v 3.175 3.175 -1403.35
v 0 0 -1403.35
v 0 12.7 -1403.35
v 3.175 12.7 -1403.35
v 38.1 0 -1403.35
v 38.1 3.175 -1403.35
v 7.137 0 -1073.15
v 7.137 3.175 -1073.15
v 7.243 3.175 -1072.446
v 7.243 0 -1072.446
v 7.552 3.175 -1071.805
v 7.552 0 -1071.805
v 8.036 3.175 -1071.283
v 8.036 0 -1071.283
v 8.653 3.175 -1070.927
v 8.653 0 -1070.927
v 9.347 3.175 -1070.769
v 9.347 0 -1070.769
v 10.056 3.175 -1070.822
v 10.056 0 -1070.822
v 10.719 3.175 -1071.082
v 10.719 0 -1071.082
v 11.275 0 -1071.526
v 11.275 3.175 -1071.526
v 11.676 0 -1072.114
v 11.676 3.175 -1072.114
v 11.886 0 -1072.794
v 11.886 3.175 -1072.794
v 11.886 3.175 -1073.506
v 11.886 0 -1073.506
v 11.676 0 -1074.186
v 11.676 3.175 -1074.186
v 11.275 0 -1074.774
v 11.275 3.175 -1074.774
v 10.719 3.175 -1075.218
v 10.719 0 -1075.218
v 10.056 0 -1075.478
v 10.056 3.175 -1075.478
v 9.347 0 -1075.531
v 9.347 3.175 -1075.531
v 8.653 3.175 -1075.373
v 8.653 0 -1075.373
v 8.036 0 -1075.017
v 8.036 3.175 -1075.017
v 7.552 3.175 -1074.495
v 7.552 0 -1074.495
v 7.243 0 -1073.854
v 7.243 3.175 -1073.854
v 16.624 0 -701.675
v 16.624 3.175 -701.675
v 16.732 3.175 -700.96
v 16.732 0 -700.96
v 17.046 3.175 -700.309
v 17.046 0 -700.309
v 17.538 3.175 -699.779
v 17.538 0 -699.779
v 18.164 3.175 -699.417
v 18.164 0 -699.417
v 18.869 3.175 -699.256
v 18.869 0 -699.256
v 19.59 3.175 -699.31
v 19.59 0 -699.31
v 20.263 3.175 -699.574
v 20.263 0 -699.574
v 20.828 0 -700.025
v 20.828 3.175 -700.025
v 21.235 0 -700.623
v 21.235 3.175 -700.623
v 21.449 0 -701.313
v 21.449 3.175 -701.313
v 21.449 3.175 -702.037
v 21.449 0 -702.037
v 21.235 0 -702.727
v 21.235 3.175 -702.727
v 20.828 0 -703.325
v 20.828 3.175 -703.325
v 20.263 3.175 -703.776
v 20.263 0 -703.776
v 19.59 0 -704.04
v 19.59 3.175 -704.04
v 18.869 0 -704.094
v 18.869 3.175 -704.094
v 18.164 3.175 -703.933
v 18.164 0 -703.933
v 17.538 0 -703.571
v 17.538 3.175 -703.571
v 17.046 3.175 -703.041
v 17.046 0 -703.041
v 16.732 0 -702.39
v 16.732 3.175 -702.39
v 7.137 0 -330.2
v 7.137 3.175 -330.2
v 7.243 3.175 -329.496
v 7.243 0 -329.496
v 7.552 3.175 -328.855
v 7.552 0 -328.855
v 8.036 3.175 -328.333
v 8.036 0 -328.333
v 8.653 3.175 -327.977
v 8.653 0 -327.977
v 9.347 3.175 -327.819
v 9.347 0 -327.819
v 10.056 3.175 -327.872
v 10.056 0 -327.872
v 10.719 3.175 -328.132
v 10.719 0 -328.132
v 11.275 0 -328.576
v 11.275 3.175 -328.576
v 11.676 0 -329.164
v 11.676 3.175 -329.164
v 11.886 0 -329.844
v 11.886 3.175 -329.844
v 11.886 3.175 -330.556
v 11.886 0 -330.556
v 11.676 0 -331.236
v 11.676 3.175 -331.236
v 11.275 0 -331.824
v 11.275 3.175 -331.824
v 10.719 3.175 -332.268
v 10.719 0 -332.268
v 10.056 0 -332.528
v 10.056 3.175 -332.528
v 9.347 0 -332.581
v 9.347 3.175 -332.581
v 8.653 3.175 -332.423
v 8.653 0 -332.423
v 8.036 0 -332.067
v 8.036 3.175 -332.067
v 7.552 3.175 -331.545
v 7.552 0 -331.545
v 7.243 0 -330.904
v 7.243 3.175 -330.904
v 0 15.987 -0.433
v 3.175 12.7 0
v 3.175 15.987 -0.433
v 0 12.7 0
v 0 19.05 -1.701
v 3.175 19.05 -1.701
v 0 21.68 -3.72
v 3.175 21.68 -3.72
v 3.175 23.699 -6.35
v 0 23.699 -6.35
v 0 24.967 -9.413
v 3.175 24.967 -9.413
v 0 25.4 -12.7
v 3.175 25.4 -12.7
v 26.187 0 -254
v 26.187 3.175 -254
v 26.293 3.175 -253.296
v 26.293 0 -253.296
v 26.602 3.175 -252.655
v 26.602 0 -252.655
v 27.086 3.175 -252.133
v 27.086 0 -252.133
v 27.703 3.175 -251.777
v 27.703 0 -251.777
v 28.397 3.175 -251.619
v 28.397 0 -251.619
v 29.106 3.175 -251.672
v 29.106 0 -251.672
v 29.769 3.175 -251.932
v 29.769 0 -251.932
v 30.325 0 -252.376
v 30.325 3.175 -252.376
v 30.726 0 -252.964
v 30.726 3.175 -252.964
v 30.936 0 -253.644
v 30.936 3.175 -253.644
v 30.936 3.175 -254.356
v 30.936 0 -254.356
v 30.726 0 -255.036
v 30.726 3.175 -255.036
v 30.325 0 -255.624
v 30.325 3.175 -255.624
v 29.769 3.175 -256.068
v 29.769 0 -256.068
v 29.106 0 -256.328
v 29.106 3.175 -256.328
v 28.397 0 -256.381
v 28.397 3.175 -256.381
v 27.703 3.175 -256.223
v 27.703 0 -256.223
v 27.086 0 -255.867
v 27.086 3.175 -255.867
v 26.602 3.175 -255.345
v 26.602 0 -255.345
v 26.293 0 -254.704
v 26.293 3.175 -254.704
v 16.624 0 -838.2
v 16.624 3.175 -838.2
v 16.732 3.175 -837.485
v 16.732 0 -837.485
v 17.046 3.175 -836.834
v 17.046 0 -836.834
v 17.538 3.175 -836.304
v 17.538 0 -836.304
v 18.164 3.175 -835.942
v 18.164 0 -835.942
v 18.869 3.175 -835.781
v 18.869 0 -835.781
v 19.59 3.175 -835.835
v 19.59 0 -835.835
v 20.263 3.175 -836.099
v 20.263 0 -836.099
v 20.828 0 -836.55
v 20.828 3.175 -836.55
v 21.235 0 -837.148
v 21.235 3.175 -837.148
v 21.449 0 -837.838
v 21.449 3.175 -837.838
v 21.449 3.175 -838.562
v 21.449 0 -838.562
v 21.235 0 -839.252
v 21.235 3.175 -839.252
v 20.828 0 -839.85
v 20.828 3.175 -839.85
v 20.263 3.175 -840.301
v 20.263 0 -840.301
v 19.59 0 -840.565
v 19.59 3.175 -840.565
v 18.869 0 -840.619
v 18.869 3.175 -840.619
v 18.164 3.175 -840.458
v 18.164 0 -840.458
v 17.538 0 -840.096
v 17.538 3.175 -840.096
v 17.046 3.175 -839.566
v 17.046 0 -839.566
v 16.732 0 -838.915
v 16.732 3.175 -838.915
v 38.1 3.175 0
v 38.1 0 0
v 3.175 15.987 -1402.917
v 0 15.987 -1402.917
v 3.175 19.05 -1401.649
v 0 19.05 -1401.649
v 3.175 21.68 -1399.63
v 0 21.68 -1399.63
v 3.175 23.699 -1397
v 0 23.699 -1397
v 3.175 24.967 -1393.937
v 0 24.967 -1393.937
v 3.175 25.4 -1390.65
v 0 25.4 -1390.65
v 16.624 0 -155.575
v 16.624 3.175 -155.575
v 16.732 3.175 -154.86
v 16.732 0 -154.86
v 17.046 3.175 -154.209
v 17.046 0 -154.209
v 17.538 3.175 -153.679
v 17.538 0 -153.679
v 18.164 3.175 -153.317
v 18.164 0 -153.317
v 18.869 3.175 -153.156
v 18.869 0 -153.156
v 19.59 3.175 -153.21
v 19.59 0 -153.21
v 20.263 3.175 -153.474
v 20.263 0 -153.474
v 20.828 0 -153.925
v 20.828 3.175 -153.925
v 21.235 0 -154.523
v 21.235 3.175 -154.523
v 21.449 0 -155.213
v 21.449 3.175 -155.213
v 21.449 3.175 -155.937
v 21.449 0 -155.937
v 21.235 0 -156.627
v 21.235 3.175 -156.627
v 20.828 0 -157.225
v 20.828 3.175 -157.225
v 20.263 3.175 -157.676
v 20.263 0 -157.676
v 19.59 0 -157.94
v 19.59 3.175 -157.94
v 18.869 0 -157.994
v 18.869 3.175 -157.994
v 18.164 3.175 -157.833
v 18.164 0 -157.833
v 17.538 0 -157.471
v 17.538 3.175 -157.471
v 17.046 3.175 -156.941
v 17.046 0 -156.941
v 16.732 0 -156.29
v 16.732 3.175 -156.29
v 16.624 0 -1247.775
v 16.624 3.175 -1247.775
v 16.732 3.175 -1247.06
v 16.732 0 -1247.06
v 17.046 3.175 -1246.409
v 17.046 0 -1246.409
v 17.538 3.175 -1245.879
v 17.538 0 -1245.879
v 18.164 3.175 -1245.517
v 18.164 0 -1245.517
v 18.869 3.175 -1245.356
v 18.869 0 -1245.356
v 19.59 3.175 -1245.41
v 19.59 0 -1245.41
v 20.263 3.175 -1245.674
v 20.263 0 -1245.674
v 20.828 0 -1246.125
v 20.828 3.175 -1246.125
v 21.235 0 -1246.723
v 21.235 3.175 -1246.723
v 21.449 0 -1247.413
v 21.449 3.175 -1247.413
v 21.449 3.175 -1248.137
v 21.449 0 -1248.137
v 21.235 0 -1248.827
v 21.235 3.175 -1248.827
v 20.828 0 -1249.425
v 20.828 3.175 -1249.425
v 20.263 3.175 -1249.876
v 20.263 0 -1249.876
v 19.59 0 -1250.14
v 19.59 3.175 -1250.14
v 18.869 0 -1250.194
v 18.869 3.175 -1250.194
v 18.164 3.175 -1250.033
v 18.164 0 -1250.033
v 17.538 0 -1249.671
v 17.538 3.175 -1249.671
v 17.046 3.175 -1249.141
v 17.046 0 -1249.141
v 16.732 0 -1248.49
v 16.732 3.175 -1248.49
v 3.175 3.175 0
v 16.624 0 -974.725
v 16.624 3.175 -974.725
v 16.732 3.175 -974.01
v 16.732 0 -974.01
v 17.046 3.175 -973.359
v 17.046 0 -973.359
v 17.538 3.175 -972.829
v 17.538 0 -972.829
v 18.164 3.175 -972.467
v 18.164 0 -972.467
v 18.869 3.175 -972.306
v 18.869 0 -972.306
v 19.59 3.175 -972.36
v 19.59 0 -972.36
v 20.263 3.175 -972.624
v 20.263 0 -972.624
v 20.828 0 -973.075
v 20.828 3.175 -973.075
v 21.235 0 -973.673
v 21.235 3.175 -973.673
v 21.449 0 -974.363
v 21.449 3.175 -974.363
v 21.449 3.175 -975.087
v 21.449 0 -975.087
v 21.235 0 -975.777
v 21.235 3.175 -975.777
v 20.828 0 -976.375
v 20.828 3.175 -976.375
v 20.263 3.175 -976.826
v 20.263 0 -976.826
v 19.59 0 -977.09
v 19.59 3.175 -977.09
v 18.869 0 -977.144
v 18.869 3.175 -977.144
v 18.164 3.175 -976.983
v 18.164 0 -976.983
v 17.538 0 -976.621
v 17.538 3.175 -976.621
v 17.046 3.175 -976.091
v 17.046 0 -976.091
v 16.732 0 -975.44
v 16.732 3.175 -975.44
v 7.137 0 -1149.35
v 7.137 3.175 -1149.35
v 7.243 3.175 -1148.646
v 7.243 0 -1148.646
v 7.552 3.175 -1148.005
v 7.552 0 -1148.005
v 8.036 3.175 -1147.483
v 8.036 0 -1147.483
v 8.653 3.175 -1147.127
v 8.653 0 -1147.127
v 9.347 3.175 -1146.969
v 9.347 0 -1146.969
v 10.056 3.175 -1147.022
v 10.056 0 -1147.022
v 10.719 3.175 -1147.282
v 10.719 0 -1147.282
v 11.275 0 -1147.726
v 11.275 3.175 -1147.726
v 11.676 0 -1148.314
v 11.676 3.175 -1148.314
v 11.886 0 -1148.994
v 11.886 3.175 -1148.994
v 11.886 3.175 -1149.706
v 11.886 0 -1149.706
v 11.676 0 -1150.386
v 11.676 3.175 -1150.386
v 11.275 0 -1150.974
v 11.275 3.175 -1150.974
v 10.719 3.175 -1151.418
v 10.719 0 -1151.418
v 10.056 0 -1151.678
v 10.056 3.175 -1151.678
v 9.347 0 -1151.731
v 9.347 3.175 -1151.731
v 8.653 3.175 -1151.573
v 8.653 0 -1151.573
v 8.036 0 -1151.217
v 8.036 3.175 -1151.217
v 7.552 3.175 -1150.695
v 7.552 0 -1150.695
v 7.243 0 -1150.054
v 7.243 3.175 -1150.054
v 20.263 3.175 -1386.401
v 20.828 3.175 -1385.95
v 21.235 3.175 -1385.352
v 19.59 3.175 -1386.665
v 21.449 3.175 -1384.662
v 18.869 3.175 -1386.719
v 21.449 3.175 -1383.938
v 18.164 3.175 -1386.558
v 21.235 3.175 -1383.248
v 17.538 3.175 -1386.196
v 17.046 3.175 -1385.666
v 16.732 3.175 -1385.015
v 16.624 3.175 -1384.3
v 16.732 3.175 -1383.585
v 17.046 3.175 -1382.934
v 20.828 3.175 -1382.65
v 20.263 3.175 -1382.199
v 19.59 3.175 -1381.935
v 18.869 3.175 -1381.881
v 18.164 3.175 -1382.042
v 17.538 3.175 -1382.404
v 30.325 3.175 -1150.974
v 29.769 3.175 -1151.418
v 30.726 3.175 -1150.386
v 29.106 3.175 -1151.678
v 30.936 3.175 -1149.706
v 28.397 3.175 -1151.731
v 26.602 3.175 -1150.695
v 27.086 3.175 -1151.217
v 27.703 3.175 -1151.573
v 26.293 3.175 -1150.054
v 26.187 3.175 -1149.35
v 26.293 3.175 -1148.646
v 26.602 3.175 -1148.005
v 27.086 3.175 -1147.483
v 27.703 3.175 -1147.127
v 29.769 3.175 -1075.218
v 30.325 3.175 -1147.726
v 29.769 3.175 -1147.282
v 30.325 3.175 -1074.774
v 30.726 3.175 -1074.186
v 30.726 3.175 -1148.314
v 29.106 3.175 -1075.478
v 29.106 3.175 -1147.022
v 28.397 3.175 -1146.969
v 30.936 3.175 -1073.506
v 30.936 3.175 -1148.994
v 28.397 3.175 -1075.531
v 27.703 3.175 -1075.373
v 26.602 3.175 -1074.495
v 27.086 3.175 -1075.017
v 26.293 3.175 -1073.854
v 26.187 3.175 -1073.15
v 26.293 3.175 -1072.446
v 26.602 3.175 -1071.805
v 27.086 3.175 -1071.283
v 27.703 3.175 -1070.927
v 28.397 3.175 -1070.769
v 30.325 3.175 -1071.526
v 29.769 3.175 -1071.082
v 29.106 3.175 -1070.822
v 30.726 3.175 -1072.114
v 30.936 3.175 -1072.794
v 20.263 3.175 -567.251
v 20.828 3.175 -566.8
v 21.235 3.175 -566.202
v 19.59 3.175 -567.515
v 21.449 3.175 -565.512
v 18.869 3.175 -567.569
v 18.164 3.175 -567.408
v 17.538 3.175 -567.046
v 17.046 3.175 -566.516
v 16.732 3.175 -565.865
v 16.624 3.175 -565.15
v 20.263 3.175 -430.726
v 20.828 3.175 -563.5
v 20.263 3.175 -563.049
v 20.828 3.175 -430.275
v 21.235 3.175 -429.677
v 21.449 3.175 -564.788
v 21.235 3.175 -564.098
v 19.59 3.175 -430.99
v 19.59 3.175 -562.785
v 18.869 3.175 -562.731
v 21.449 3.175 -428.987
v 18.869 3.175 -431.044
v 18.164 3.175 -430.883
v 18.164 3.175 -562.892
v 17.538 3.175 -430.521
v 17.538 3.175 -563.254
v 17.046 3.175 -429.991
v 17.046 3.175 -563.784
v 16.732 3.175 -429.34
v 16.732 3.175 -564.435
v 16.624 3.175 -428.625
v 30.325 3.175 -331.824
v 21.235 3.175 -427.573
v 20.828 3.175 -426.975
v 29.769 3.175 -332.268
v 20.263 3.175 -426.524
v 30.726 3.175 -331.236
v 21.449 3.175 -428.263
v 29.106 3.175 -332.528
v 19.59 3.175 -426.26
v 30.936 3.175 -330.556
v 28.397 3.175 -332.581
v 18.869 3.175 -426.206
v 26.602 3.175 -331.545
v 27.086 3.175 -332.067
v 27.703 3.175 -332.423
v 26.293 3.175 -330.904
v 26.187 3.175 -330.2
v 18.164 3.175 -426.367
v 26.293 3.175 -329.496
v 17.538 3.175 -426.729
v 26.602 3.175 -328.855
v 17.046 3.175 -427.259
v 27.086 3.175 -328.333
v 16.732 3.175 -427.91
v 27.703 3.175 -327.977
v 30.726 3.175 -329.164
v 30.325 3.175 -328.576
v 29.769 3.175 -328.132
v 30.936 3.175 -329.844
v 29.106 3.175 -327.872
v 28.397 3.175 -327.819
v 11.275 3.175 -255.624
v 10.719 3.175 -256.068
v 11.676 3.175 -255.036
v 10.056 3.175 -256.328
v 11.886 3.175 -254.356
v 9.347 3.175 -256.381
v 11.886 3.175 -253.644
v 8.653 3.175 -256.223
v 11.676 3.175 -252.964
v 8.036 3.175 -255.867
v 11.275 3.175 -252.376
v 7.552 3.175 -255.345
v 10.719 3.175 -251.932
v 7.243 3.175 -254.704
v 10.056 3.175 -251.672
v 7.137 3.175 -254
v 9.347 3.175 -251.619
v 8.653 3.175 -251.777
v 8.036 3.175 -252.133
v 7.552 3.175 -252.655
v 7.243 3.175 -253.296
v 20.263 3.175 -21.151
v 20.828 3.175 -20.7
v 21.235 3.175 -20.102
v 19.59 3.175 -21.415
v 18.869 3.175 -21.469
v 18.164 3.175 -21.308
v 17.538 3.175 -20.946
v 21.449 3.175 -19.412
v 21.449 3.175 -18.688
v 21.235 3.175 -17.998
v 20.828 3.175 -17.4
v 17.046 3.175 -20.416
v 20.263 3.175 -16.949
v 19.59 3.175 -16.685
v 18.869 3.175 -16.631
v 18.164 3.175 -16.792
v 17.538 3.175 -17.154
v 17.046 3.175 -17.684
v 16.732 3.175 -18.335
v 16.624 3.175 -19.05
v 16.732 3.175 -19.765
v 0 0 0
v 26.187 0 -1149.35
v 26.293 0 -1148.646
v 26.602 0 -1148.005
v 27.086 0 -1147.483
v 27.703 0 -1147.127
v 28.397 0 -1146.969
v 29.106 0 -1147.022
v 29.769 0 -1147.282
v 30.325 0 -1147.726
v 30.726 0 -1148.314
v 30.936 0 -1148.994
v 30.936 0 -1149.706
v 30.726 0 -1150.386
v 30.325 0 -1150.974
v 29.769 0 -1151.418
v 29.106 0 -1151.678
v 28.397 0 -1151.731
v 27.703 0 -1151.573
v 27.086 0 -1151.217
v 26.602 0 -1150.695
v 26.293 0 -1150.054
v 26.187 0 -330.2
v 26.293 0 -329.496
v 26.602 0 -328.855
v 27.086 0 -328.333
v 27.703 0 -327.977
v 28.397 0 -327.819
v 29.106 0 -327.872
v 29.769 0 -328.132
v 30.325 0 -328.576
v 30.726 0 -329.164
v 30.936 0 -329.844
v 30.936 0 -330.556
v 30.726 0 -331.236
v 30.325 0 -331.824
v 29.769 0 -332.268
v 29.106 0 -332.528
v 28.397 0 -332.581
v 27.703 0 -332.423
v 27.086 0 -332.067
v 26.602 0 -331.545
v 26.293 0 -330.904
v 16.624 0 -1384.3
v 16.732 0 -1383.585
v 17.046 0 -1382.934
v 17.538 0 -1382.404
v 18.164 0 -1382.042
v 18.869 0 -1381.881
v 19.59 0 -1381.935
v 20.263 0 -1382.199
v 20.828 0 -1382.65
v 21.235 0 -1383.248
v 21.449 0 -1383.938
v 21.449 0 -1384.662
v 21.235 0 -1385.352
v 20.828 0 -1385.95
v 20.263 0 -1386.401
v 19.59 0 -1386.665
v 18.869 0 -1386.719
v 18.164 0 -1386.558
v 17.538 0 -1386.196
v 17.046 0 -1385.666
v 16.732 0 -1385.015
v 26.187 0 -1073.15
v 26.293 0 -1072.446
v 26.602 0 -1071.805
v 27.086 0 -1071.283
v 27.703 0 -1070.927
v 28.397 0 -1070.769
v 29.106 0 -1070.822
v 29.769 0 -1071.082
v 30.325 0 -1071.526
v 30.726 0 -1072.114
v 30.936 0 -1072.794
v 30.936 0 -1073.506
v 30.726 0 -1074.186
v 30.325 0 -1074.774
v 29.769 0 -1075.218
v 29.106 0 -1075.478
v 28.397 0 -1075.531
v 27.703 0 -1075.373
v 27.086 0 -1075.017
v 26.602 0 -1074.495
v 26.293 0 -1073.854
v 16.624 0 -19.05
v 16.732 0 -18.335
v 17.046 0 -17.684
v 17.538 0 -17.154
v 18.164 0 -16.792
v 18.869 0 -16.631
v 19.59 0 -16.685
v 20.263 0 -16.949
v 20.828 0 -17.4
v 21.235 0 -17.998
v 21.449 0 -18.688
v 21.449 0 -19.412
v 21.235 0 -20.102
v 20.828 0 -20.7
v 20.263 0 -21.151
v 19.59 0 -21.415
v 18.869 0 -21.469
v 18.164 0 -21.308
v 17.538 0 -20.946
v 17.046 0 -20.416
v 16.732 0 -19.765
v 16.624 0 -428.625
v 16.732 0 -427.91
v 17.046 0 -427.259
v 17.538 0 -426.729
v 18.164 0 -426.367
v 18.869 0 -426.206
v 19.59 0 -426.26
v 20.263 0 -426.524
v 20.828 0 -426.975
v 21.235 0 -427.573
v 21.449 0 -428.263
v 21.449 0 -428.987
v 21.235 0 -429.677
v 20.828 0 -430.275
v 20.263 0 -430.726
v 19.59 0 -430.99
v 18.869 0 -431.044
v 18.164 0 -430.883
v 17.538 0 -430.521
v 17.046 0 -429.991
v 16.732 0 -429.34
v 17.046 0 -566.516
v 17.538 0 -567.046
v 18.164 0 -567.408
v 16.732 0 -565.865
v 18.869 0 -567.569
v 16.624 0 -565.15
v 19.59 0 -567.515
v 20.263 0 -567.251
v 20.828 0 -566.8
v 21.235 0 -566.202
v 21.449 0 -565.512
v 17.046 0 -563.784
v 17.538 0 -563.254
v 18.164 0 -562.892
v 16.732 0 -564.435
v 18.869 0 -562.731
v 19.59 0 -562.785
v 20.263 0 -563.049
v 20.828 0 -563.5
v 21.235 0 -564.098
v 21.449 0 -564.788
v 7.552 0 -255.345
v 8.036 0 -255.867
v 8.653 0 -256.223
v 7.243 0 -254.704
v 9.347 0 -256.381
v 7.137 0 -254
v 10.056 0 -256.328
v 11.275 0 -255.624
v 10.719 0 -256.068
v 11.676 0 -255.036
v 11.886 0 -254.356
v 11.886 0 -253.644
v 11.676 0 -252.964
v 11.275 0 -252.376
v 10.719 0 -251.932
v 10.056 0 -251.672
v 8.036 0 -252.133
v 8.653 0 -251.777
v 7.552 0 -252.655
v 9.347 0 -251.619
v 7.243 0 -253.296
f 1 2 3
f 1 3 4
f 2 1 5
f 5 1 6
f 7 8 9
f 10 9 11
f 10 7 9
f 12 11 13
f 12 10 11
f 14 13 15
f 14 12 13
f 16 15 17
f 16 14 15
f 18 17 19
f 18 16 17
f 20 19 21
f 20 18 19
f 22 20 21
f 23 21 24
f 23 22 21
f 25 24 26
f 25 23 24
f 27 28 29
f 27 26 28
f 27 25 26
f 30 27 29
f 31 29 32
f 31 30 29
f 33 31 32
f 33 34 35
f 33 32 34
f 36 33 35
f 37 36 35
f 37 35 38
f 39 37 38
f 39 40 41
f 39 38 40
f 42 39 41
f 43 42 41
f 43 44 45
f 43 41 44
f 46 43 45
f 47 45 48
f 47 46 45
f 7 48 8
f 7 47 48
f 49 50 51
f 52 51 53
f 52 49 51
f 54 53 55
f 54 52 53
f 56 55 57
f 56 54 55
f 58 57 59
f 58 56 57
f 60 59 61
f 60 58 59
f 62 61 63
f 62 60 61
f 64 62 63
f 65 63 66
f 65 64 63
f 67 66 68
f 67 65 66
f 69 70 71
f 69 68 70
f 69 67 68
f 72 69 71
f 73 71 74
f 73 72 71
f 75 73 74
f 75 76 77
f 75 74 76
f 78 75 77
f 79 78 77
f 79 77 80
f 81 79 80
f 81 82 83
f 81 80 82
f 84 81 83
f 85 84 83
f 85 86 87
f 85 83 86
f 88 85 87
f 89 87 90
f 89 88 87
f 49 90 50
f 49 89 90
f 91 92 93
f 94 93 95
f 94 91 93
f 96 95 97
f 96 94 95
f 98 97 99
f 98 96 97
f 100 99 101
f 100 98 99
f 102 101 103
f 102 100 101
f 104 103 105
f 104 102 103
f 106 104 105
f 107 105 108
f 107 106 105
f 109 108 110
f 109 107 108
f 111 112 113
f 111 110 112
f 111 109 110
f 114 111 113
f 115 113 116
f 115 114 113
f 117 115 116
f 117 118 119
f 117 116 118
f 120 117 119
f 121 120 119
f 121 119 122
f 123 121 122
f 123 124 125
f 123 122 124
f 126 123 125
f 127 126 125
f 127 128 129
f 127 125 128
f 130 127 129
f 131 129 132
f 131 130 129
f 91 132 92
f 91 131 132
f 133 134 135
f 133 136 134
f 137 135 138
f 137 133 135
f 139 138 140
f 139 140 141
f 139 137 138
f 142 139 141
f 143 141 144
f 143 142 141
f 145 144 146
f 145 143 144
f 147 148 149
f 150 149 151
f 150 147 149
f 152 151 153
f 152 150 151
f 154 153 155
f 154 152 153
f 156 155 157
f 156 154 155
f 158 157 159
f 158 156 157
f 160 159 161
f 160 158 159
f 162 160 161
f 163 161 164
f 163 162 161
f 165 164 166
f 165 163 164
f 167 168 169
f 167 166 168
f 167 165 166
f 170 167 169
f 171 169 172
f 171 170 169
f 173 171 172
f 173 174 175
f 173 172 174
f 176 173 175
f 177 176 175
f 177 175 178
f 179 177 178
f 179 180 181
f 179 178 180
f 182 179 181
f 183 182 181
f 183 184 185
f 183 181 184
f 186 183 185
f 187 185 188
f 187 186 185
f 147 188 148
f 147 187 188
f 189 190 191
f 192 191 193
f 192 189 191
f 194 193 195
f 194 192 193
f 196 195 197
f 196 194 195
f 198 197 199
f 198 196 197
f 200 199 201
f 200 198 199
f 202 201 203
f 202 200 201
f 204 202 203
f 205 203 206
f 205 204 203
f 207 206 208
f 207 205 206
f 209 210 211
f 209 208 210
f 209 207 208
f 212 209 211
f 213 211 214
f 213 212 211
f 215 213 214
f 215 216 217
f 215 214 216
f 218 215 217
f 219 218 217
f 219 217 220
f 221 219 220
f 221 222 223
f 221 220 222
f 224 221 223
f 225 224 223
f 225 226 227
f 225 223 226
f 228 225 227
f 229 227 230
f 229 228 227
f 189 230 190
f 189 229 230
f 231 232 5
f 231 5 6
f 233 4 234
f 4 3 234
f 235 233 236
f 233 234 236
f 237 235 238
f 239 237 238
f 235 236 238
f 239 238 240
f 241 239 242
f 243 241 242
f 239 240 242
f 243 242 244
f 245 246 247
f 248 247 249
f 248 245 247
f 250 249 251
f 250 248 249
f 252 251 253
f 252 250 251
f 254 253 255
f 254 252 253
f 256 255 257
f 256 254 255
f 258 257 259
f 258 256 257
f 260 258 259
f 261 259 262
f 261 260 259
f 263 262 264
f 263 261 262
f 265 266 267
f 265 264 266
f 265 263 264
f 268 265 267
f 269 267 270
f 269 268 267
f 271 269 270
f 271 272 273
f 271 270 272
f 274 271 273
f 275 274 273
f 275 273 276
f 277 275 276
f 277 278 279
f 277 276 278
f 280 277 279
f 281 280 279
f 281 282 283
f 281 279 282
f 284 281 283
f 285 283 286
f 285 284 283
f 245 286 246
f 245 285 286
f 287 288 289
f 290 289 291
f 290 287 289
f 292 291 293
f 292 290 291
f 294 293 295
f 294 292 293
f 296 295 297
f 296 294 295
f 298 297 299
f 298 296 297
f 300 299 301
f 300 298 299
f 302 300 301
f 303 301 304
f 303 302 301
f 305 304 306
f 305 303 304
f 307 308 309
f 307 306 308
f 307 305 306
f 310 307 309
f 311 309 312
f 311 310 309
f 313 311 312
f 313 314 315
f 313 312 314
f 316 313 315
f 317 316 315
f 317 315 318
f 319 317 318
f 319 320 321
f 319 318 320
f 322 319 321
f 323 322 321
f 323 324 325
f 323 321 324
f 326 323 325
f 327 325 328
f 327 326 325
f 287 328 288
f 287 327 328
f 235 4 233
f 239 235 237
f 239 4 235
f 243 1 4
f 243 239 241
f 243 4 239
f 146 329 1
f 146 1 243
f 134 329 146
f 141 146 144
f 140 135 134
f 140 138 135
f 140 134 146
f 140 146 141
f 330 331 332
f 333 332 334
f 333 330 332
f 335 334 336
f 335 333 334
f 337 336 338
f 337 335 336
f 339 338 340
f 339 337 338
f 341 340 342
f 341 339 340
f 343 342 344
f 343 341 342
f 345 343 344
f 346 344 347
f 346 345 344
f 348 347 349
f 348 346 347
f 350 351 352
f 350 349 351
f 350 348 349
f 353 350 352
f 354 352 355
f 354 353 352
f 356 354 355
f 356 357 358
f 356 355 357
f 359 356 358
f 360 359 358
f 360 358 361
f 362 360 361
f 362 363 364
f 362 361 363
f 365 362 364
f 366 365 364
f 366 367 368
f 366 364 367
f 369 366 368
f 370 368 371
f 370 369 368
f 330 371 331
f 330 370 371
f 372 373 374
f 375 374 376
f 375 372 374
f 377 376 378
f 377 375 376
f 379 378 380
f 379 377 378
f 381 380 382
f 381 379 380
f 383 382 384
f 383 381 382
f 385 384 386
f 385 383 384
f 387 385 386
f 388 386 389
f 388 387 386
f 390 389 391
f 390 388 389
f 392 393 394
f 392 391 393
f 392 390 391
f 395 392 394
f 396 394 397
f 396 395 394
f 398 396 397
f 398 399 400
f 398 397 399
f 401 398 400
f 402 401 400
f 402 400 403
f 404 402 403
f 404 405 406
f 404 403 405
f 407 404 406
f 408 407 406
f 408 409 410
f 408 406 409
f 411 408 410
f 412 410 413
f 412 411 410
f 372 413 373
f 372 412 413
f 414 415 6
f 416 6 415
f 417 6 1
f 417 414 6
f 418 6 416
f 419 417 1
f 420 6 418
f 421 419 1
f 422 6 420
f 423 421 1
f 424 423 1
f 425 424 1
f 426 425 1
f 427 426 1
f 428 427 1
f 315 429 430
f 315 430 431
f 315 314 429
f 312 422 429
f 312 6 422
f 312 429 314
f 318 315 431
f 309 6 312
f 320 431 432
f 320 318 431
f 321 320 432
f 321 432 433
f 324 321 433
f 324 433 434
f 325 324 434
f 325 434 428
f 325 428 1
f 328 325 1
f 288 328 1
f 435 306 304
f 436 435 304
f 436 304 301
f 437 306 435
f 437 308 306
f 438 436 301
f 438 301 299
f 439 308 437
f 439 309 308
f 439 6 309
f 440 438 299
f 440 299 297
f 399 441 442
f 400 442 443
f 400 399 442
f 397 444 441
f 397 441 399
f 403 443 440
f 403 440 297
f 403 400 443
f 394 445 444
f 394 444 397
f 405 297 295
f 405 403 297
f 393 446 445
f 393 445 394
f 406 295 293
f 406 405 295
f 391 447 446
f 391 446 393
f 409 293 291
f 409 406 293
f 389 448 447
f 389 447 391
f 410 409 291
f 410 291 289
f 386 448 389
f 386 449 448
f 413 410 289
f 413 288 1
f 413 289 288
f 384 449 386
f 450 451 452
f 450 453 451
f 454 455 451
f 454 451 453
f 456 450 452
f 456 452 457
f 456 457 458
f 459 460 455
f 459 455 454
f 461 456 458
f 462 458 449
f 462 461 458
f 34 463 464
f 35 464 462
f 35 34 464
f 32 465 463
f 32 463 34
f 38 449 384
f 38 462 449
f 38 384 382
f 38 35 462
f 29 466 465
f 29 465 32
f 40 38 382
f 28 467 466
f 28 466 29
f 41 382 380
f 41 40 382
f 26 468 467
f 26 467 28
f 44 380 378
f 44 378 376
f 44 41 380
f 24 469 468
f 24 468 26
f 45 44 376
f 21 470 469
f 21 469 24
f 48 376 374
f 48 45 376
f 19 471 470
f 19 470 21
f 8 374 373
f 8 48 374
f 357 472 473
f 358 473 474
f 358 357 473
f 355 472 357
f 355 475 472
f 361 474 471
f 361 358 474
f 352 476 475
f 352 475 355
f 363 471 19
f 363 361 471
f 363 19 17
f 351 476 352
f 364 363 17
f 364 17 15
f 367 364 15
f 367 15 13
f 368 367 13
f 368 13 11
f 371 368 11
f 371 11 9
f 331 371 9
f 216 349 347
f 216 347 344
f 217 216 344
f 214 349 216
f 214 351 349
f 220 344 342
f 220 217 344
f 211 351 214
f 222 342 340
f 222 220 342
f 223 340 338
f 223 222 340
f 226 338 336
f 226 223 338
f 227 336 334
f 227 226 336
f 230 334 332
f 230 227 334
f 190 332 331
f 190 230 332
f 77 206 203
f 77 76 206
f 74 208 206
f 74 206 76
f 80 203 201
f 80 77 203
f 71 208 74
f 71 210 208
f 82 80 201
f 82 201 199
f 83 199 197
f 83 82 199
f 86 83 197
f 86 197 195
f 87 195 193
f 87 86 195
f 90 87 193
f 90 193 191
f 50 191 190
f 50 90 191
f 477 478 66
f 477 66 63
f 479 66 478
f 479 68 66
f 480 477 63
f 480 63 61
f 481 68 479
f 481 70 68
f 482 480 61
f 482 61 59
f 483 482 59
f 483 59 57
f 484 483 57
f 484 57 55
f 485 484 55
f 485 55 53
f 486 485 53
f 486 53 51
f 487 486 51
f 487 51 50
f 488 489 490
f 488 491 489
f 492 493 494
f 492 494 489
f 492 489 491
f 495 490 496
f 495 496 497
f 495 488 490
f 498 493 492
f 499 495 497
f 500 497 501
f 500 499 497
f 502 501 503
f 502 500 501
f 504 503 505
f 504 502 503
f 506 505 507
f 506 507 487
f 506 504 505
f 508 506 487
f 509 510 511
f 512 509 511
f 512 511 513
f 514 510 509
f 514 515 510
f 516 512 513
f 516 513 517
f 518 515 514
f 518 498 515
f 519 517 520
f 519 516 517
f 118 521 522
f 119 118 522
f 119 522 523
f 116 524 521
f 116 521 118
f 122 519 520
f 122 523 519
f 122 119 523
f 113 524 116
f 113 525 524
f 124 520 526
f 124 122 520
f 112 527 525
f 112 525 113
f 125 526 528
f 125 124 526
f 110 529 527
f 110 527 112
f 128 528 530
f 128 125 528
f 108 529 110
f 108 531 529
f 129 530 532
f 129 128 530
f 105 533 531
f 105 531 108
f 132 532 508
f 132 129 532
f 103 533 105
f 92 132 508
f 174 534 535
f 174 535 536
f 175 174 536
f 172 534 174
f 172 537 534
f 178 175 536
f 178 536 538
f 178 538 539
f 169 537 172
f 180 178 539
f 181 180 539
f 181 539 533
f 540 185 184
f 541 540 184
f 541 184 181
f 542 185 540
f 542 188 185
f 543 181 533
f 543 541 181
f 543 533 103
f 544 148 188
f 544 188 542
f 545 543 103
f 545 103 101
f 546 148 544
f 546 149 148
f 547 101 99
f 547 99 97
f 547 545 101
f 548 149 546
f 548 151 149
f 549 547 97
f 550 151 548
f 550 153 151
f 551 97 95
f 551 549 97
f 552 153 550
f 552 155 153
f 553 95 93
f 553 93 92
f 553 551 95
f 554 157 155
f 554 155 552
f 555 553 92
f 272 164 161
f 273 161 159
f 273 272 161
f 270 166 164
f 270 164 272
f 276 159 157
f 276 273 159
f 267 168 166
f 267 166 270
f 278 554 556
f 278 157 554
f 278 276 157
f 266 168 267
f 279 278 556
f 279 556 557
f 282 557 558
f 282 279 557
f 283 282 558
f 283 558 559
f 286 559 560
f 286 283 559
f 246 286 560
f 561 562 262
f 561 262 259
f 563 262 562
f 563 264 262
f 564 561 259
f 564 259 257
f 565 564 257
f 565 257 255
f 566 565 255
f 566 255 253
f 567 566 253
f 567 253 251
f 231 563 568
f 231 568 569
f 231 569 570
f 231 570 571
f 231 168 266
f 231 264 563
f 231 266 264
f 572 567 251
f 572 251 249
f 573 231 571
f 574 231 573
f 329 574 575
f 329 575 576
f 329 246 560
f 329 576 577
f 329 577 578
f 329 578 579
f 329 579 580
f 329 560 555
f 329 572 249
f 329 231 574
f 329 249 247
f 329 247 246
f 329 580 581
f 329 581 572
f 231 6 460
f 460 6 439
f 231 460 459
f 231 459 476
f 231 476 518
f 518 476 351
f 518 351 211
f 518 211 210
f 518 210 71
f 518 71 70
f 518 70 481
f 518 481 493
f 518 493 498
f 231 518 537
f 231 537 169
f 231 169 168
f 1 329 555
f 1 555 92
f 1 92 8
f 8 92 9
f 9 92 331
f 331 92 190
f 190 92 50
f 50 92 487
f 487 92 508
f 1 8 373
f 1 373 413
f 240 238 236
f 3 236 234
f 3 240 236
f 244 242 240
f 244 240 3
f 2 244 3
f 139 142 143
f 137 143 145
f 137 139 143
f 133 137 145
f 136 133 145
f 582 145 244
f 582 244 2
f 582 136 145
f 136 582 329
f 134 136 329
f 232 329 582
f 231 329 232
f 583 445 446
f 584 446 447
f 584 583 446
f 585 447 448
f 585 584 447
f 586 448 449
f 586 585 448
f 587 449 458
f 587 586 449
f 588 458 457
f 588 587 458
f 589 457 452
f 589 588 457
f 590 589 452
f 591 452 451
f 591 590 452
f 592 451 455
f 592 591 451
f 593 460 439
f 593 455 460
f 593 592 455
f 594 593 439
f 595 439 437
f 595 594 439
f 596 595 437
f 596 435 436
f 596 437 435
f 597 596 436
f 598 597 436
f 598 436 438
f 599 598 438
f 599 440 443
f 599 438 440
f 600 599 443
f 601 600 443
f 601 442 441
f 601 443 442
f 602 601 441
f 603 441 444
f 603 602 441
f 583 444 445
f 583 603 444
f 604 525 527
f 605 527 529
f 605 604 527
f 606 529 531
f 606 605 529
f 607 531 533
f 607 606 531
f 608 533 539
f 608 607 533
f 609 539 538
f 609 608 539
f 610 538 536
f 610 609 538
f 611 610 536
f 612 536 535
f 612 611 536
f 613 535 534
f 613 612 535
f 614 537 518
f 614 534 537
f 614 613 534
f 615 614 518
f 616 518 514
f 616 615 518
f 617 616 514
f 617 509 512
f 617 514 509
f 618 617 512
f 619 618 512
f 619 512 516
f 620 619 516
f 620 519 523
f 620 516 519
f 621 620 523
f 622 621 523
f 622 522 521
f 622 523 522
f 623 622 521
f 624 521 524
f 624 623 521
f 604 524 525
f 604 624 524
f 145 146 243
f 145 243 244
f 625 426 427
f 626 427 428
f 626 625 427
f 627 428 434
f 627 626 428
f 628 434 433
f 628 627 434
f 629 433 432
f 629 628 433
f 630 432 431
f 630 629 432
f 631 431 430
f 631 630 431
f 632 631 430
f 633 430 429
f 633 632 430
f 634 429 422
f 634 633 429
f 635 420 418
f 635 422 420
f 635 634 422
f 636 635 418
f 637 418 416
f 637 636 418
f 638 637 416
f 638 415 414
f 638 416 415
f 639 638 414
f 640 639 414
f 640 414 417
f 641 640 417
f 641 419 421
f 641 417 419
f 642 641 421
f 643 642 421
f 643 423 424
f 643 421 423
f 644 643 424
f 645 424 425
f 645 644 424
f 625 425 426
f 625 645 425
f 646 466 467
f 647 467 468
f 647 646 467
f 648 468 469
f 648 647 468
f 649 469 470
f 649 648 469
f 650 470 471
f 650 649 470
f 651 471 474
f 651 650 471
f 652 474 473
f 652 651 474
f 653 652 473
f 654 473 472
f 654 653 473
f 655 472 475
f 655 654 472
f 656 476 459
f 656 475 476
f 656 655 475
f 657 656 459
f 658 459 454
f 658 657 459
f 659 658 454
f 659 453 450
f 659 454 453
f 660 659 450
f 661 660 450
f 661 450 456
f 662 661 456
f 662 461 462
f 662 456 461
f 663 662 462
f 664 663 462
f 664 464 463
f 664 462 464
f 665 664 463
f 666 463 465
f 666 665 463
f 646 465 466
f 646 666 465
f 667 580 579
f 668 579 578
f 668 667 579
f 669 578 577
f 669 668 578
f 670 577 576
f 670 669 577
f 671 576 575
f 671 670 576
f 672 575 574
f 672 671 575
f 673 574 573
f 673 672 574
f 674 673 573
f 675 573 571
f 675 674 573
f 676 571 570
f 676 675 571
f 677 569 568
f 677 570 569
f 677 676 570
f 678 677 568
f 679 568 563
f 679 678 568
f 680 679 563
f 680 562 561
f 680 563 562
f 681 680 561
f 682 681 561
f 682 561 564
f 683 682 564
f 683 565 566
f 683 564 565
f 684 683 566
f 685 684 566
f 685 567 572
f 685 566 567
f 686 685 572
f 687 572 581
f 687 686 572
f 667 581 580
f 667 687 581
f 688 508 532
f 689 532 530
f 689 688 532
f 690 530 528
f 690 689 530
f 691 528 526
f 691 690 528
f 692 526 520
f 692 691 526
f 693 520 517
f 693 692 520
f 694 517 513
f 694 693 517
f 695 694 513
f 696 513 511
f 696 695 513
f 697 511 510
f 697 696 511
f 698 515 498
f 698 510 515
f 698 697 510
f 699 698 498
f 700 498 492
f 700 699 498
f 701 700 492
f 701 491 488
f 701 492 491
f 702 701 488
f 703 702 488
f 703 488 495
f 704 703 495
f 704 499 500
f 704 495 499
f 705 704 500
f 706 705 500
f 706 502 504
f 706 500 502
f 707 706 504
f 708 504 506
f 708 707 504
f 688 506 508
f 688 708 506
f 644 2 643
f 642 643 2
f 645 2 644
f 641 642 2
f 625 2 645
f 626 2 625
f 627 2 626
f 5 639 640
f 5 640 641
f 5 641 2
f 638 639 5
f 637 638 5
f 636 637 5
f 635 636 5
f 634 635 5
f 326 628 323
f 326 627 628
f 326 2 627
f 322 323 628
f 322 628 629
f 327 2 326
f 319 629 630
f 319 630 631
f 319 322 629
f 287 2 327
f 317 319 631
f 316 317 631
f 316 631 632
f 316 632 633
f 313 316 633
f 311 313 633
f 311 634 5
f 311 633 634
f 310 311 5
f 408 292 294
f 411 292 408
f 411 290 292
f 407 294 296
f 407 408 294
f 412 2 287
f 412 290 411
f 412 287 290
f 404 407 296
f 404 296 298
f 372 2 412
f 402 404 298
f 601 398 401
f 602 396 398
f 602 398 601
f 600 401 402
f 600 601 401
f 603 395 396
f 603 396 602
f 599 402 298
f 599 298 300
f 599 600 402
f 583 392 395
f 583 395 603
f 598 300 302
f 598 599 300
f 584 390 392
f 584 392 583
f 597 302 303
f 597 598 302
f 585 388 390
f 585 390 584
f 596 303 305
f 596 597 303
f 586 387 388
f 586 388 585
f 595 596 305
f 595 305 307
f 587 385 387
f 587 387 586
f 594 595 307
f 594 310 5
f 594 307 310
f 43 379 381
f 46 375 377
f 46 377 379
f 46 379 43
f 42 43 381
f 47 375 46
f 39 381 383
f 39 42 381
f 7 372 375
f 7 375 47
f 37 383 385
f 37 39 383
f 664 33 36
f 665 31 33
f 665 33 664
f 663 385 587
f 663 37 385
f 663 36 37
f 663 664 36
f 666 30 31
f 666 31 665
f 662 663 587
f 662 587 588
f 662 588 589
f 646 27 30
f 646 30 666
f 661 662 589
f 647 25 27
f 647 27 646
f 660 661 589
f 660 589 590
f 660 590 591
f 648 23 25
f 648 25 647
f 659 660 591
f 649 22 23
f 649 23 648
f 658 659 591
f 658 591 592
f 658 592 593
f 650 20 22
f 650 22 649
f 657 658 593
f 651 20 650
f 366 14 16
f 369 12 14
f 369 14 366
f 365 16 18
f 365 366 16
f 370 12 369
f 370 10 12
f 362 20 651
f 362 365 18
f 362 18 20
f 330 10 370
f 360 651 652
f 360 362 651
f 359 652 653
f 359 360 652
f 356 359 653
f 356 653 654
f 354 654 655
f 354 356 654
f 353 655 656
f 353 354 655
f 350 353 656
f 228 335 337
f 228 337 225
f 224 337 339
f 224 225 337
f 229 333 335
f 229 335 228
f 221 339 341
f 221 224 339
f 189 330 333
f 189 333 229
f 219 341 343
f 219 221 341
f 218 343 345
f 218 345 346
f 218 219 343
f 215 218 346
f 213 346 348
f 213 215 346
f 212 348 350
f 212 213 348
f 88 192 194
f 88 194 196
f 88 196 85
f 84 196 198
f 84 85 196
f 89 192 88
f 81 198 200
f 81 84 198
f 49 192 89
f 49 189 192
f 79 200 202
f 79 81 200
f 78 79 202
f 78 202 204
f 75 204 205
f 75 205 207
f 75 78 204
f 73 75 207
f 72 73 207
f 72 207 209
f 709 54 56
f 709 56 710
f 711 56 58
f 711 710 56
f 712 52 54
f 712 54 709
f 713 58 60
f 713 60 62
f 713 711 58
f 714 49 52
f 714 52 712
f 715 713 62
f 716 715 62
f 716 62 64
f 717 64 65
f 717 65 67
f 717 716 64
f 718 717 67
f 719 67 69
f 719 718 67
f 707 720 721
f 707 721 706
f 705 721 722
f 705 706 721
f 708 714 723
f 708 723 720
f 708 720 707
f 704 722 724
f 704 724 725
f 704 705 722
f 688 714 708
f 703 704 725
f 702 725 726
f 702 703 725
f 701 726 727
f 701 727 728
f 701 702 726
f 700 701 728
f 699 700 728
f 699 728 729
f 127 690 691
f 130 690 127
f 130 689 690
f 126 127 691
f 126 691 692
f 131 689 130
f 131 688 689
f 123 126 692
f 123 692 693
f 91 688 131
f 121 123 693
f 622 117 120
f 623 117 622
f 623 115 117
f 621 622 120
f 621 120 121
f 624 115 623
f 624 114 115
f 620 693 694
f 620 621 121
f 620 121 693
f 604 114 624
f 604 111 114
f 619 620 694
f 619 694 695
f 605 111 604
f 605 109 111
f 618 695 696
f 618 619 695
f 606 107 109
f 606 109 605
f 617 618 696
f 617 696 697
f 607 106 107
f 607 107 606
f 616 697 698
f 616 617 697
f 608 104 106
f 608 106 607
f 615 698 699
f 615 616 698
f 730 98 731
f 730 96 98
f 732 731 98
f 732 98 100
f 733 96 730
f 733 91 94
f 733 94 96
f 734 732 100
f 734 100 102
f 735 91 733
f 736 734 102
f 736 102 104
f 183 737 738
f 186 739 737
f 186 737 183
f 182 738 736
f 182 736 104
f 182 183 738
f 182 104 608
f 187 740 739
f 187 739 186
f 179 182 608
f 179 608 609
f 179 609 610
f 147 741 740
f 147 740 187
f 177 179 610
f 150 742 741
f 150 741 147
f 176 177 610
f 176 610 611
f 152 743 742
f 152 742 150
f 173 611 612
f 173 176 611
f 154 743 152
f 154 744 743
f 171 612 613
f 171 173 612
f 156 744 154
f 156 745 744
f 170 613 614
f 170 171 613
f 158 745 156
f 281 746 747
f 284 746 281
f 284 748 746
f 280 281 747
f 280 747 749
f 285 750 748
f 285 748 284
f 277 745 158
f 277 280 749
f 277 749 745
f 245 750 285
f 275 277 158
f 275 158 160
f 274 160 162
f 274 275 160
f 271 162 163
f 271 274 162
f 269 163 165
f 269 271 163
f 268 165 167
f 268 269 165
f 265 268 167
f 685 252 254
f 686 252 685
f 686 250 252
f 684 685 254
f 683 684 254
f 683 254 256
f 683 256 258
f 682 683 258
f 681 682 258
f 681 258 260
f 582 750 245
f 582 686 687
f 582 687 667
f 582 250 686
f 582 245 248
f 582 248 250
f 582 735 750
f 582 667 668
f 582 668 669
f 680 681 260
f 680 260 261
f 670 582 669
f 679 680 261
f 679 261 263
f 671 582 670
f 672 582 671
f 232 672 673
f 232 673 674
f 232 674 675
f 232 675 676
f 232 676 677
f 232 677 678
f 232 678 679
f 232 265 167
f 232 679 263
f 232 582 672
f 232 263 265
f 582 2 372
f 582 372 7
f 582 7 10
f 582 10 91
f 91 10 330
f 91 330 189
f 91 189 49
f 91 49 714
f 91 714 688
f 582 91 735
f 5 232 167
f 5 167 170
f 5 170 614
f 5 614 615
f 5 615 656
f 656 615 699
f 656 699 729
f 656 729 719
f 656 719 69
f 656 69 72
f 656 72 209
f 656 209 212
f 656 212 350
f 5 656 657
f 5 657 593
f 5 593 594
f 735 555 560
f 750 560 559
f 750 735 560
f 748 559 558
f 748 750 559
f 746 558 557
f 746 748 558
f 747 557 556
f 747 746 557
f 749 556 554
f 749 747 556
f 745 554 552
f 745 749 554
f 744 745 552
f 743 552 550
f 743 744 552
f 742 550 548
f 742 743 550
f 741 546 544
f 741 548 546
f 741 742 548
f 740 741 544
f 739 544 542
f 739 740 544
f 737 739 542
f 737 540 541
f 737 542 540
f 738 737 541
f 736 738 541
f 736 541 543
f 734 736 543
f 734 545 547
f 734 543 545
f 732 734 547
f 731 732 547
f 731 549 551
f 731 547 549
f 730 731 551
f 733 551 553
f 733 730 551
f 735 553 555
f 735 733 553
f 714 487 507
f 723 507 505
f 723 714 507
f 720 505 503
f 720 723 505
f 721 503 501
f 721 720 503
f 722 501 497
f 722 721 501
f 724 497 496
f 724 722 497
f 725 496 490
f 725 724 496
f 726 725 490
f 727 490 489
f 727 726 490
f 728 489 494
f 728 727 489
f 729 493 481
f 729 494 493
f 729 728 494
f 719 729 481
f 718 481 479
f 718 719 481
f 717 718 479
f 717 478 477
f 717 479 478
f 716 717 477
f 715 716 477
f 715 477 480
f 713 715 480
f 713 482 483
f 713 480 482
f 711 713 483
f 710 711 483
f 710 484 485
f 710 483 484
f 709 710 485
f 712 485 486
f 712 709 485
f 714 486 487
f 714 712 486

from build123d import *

# Parameters (mm, degrees)
EXTRUDE1_DEPTH     = 1403.35
SKETCH2_R          = 2.3876
SKETCH2_R_2        = 2.4257
CUT_EXTRUDE1_DEPTH = 1405.096860085
FILLET1_R          = 12.7


with BuildPart() as part:
    # Sketch1 → Extrude1 (new body)
    with BuildSketch(Plane.XY):
        Polygon((0, 0), (38.1, 0), (38.1, 3.175), (3.175, 3.175), (3.175, 25.4), (0, 25.4), align=None)
    extrude(amount=-EXTRUDE1_DEPTH)

    # Sketch2 → Cut-Extrude1 (cut, through all)
    with BuildSketch(Plane(origin=(0, 0, 0), x_dir=(1, 0, 0), z_dir=(0, 1, 0))):
        with Locations(Location((9.525, 254, 0), (0, 0, 180))):
            Circle(SKETCH2_R)
        with Locations(Location((28.575, 254, 0), (0, 0, 180))):
            Circle(SKETCH2_R)
        with Locations(Location((9.525, 1073.15, 0), (0, 0, 180))):
            Circle(SKETCH2_R)
        with Locations(Location((28.575, 1073.15, 0), (0, 0, 180))):
            Circle(SKETCH2_R)
        with Locations(Location((19.05, 19.05, 0), (0, 0, 180))):
            Circle(SKETCH2_R_2)
        with Locations(Location((19.05, 155.575, 0), (0, 0, 180))):
            Circle(SKETCH2_R_2)
        with Locations(Location((19.05, 428.625, 0), (0, 0, 180))):
            Circle(SKETCH2_R_2)
        with Locations(Location((19.05, 565.15, 0), (0, 0, 180))):
            Circle(SKETCH2_R_2)
        with Locations(Location((19.05, 701.675, 0), (0, 0, 180))):
            Circle(SKETCH2_R_2)
        with Locations(Location((19.05, 838.2, 0), (0, 0, 180))):
            Circle(SKETCH2_R_2)
        with Locations(Location((19.05, 974.725, 0), (0, 0, 180))):
            Circle(SKETCH2_R_2)
        with Locations(Location((19.05, 1247.775, 0), (0, 0, 180))):
            Circle(SKETCH2_R_2)
        with Locations(Location((19.05, 1384.3, 0), (0, 0, 180))):
            Circle(SKETCH2_R_2)
        with Locations(Location((28.575, 330.2, 0), (0, 0, 180))):
            Circle(SKETCH2_R)
        with Locations(Location((9.525, 330.2, 0), (0, 0, 180))):
            Circle(SKETCH2_R)
        with Locations(Location((28.575, 1149.35, 0), (0, 0, 180))):
            Circle(SKETCH2_R)
        with Locations(Location((9.525, 1149.35, 0), (0, 0, 180))):
            Circle(SKETCH2_R)
    extrude(amount=CUT_EXTRUDE1_DEPTH, mode=Mode.SUBTRACT)

    # Fillet1
    fillet1_edges = [part.edges().sort_by_distance(p)[0] for p in [
        (1.5875, 25.4, -1403.35),
        (1.5875, 25.4, 0),
    ]]
    fillet(fillet1_edges, radius=FILLET1_R)


solid = part.part
